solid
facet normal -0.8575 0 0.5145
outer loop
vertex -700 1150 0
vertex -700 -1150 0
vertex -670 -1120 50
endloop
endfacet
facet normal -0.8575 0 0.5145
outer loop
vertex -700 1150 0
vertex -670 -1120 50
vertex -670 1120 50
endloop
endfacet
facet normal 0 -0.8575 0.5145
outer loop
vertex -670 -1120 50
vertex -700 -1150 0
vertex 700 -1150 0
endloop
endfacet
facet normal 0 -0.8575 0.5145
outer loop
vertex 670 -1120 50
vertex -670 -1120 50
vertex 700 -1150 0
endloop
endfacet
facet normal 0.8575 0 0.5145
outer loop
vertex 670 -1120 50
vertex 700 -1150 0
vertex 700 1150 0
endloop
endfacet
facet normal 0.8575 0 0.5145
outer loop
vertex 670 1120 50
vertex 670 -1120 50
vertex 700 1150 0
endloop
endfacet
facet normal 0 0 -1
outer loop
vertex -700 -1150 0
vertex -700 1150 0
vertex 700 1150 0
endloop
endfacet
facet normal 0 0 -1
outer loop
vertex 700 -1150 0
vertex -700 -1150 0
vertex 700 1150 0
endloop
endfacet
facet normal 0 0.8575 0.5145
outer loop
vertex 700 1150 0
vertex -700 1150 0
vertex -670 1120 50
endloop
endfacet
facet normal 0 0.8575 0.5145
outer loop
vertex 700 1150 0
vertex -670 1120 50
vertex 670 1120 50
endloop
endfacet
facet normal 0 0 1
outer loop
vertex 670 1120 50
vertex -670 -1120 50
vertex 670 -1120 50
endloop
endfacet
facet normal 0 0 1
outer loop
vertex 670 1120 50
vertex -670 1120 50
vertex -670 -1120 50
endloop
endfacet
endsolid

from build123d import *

# Parameters (mm, degrees)
F0_W     = 1400
F0_H     = 2300
F1_DEPTH = 50
F2_SIZE2 = 49.99999
F2_SIZE  = 29.99999


# Not quite as in the source:
# - a fillet or chamfer is up to 0.001 mm smaller than in the source, because OpenCascade refuses the exact size


with BuildPart() as f1:
    # F0 (on Top) → F1 (new body)
    with BuildSketch(Plane.XY):
        Rectangle(F0_W, F0_H)
    extrude(amount=F1_DEPTH)

    # F2 (size 30 and 50 in the source; OpenCascade refuses exactly that, so slightly less here)
    f2_edges = [f1.edges().sort_by_distance(p)[0] for p in [
        (0, -1150, 50),
        (700, 0, 50),
        (0, 1150, 50),
        (-700, 0, 50),
    ]]
    f2_side = f1.faces().sort_by_distance((0, 0, 50))[0]
    chamfer(f2_edges, length=F2_SIZE, length2=F2_SIZE2, reference=f2_side)


solid = f1.part
